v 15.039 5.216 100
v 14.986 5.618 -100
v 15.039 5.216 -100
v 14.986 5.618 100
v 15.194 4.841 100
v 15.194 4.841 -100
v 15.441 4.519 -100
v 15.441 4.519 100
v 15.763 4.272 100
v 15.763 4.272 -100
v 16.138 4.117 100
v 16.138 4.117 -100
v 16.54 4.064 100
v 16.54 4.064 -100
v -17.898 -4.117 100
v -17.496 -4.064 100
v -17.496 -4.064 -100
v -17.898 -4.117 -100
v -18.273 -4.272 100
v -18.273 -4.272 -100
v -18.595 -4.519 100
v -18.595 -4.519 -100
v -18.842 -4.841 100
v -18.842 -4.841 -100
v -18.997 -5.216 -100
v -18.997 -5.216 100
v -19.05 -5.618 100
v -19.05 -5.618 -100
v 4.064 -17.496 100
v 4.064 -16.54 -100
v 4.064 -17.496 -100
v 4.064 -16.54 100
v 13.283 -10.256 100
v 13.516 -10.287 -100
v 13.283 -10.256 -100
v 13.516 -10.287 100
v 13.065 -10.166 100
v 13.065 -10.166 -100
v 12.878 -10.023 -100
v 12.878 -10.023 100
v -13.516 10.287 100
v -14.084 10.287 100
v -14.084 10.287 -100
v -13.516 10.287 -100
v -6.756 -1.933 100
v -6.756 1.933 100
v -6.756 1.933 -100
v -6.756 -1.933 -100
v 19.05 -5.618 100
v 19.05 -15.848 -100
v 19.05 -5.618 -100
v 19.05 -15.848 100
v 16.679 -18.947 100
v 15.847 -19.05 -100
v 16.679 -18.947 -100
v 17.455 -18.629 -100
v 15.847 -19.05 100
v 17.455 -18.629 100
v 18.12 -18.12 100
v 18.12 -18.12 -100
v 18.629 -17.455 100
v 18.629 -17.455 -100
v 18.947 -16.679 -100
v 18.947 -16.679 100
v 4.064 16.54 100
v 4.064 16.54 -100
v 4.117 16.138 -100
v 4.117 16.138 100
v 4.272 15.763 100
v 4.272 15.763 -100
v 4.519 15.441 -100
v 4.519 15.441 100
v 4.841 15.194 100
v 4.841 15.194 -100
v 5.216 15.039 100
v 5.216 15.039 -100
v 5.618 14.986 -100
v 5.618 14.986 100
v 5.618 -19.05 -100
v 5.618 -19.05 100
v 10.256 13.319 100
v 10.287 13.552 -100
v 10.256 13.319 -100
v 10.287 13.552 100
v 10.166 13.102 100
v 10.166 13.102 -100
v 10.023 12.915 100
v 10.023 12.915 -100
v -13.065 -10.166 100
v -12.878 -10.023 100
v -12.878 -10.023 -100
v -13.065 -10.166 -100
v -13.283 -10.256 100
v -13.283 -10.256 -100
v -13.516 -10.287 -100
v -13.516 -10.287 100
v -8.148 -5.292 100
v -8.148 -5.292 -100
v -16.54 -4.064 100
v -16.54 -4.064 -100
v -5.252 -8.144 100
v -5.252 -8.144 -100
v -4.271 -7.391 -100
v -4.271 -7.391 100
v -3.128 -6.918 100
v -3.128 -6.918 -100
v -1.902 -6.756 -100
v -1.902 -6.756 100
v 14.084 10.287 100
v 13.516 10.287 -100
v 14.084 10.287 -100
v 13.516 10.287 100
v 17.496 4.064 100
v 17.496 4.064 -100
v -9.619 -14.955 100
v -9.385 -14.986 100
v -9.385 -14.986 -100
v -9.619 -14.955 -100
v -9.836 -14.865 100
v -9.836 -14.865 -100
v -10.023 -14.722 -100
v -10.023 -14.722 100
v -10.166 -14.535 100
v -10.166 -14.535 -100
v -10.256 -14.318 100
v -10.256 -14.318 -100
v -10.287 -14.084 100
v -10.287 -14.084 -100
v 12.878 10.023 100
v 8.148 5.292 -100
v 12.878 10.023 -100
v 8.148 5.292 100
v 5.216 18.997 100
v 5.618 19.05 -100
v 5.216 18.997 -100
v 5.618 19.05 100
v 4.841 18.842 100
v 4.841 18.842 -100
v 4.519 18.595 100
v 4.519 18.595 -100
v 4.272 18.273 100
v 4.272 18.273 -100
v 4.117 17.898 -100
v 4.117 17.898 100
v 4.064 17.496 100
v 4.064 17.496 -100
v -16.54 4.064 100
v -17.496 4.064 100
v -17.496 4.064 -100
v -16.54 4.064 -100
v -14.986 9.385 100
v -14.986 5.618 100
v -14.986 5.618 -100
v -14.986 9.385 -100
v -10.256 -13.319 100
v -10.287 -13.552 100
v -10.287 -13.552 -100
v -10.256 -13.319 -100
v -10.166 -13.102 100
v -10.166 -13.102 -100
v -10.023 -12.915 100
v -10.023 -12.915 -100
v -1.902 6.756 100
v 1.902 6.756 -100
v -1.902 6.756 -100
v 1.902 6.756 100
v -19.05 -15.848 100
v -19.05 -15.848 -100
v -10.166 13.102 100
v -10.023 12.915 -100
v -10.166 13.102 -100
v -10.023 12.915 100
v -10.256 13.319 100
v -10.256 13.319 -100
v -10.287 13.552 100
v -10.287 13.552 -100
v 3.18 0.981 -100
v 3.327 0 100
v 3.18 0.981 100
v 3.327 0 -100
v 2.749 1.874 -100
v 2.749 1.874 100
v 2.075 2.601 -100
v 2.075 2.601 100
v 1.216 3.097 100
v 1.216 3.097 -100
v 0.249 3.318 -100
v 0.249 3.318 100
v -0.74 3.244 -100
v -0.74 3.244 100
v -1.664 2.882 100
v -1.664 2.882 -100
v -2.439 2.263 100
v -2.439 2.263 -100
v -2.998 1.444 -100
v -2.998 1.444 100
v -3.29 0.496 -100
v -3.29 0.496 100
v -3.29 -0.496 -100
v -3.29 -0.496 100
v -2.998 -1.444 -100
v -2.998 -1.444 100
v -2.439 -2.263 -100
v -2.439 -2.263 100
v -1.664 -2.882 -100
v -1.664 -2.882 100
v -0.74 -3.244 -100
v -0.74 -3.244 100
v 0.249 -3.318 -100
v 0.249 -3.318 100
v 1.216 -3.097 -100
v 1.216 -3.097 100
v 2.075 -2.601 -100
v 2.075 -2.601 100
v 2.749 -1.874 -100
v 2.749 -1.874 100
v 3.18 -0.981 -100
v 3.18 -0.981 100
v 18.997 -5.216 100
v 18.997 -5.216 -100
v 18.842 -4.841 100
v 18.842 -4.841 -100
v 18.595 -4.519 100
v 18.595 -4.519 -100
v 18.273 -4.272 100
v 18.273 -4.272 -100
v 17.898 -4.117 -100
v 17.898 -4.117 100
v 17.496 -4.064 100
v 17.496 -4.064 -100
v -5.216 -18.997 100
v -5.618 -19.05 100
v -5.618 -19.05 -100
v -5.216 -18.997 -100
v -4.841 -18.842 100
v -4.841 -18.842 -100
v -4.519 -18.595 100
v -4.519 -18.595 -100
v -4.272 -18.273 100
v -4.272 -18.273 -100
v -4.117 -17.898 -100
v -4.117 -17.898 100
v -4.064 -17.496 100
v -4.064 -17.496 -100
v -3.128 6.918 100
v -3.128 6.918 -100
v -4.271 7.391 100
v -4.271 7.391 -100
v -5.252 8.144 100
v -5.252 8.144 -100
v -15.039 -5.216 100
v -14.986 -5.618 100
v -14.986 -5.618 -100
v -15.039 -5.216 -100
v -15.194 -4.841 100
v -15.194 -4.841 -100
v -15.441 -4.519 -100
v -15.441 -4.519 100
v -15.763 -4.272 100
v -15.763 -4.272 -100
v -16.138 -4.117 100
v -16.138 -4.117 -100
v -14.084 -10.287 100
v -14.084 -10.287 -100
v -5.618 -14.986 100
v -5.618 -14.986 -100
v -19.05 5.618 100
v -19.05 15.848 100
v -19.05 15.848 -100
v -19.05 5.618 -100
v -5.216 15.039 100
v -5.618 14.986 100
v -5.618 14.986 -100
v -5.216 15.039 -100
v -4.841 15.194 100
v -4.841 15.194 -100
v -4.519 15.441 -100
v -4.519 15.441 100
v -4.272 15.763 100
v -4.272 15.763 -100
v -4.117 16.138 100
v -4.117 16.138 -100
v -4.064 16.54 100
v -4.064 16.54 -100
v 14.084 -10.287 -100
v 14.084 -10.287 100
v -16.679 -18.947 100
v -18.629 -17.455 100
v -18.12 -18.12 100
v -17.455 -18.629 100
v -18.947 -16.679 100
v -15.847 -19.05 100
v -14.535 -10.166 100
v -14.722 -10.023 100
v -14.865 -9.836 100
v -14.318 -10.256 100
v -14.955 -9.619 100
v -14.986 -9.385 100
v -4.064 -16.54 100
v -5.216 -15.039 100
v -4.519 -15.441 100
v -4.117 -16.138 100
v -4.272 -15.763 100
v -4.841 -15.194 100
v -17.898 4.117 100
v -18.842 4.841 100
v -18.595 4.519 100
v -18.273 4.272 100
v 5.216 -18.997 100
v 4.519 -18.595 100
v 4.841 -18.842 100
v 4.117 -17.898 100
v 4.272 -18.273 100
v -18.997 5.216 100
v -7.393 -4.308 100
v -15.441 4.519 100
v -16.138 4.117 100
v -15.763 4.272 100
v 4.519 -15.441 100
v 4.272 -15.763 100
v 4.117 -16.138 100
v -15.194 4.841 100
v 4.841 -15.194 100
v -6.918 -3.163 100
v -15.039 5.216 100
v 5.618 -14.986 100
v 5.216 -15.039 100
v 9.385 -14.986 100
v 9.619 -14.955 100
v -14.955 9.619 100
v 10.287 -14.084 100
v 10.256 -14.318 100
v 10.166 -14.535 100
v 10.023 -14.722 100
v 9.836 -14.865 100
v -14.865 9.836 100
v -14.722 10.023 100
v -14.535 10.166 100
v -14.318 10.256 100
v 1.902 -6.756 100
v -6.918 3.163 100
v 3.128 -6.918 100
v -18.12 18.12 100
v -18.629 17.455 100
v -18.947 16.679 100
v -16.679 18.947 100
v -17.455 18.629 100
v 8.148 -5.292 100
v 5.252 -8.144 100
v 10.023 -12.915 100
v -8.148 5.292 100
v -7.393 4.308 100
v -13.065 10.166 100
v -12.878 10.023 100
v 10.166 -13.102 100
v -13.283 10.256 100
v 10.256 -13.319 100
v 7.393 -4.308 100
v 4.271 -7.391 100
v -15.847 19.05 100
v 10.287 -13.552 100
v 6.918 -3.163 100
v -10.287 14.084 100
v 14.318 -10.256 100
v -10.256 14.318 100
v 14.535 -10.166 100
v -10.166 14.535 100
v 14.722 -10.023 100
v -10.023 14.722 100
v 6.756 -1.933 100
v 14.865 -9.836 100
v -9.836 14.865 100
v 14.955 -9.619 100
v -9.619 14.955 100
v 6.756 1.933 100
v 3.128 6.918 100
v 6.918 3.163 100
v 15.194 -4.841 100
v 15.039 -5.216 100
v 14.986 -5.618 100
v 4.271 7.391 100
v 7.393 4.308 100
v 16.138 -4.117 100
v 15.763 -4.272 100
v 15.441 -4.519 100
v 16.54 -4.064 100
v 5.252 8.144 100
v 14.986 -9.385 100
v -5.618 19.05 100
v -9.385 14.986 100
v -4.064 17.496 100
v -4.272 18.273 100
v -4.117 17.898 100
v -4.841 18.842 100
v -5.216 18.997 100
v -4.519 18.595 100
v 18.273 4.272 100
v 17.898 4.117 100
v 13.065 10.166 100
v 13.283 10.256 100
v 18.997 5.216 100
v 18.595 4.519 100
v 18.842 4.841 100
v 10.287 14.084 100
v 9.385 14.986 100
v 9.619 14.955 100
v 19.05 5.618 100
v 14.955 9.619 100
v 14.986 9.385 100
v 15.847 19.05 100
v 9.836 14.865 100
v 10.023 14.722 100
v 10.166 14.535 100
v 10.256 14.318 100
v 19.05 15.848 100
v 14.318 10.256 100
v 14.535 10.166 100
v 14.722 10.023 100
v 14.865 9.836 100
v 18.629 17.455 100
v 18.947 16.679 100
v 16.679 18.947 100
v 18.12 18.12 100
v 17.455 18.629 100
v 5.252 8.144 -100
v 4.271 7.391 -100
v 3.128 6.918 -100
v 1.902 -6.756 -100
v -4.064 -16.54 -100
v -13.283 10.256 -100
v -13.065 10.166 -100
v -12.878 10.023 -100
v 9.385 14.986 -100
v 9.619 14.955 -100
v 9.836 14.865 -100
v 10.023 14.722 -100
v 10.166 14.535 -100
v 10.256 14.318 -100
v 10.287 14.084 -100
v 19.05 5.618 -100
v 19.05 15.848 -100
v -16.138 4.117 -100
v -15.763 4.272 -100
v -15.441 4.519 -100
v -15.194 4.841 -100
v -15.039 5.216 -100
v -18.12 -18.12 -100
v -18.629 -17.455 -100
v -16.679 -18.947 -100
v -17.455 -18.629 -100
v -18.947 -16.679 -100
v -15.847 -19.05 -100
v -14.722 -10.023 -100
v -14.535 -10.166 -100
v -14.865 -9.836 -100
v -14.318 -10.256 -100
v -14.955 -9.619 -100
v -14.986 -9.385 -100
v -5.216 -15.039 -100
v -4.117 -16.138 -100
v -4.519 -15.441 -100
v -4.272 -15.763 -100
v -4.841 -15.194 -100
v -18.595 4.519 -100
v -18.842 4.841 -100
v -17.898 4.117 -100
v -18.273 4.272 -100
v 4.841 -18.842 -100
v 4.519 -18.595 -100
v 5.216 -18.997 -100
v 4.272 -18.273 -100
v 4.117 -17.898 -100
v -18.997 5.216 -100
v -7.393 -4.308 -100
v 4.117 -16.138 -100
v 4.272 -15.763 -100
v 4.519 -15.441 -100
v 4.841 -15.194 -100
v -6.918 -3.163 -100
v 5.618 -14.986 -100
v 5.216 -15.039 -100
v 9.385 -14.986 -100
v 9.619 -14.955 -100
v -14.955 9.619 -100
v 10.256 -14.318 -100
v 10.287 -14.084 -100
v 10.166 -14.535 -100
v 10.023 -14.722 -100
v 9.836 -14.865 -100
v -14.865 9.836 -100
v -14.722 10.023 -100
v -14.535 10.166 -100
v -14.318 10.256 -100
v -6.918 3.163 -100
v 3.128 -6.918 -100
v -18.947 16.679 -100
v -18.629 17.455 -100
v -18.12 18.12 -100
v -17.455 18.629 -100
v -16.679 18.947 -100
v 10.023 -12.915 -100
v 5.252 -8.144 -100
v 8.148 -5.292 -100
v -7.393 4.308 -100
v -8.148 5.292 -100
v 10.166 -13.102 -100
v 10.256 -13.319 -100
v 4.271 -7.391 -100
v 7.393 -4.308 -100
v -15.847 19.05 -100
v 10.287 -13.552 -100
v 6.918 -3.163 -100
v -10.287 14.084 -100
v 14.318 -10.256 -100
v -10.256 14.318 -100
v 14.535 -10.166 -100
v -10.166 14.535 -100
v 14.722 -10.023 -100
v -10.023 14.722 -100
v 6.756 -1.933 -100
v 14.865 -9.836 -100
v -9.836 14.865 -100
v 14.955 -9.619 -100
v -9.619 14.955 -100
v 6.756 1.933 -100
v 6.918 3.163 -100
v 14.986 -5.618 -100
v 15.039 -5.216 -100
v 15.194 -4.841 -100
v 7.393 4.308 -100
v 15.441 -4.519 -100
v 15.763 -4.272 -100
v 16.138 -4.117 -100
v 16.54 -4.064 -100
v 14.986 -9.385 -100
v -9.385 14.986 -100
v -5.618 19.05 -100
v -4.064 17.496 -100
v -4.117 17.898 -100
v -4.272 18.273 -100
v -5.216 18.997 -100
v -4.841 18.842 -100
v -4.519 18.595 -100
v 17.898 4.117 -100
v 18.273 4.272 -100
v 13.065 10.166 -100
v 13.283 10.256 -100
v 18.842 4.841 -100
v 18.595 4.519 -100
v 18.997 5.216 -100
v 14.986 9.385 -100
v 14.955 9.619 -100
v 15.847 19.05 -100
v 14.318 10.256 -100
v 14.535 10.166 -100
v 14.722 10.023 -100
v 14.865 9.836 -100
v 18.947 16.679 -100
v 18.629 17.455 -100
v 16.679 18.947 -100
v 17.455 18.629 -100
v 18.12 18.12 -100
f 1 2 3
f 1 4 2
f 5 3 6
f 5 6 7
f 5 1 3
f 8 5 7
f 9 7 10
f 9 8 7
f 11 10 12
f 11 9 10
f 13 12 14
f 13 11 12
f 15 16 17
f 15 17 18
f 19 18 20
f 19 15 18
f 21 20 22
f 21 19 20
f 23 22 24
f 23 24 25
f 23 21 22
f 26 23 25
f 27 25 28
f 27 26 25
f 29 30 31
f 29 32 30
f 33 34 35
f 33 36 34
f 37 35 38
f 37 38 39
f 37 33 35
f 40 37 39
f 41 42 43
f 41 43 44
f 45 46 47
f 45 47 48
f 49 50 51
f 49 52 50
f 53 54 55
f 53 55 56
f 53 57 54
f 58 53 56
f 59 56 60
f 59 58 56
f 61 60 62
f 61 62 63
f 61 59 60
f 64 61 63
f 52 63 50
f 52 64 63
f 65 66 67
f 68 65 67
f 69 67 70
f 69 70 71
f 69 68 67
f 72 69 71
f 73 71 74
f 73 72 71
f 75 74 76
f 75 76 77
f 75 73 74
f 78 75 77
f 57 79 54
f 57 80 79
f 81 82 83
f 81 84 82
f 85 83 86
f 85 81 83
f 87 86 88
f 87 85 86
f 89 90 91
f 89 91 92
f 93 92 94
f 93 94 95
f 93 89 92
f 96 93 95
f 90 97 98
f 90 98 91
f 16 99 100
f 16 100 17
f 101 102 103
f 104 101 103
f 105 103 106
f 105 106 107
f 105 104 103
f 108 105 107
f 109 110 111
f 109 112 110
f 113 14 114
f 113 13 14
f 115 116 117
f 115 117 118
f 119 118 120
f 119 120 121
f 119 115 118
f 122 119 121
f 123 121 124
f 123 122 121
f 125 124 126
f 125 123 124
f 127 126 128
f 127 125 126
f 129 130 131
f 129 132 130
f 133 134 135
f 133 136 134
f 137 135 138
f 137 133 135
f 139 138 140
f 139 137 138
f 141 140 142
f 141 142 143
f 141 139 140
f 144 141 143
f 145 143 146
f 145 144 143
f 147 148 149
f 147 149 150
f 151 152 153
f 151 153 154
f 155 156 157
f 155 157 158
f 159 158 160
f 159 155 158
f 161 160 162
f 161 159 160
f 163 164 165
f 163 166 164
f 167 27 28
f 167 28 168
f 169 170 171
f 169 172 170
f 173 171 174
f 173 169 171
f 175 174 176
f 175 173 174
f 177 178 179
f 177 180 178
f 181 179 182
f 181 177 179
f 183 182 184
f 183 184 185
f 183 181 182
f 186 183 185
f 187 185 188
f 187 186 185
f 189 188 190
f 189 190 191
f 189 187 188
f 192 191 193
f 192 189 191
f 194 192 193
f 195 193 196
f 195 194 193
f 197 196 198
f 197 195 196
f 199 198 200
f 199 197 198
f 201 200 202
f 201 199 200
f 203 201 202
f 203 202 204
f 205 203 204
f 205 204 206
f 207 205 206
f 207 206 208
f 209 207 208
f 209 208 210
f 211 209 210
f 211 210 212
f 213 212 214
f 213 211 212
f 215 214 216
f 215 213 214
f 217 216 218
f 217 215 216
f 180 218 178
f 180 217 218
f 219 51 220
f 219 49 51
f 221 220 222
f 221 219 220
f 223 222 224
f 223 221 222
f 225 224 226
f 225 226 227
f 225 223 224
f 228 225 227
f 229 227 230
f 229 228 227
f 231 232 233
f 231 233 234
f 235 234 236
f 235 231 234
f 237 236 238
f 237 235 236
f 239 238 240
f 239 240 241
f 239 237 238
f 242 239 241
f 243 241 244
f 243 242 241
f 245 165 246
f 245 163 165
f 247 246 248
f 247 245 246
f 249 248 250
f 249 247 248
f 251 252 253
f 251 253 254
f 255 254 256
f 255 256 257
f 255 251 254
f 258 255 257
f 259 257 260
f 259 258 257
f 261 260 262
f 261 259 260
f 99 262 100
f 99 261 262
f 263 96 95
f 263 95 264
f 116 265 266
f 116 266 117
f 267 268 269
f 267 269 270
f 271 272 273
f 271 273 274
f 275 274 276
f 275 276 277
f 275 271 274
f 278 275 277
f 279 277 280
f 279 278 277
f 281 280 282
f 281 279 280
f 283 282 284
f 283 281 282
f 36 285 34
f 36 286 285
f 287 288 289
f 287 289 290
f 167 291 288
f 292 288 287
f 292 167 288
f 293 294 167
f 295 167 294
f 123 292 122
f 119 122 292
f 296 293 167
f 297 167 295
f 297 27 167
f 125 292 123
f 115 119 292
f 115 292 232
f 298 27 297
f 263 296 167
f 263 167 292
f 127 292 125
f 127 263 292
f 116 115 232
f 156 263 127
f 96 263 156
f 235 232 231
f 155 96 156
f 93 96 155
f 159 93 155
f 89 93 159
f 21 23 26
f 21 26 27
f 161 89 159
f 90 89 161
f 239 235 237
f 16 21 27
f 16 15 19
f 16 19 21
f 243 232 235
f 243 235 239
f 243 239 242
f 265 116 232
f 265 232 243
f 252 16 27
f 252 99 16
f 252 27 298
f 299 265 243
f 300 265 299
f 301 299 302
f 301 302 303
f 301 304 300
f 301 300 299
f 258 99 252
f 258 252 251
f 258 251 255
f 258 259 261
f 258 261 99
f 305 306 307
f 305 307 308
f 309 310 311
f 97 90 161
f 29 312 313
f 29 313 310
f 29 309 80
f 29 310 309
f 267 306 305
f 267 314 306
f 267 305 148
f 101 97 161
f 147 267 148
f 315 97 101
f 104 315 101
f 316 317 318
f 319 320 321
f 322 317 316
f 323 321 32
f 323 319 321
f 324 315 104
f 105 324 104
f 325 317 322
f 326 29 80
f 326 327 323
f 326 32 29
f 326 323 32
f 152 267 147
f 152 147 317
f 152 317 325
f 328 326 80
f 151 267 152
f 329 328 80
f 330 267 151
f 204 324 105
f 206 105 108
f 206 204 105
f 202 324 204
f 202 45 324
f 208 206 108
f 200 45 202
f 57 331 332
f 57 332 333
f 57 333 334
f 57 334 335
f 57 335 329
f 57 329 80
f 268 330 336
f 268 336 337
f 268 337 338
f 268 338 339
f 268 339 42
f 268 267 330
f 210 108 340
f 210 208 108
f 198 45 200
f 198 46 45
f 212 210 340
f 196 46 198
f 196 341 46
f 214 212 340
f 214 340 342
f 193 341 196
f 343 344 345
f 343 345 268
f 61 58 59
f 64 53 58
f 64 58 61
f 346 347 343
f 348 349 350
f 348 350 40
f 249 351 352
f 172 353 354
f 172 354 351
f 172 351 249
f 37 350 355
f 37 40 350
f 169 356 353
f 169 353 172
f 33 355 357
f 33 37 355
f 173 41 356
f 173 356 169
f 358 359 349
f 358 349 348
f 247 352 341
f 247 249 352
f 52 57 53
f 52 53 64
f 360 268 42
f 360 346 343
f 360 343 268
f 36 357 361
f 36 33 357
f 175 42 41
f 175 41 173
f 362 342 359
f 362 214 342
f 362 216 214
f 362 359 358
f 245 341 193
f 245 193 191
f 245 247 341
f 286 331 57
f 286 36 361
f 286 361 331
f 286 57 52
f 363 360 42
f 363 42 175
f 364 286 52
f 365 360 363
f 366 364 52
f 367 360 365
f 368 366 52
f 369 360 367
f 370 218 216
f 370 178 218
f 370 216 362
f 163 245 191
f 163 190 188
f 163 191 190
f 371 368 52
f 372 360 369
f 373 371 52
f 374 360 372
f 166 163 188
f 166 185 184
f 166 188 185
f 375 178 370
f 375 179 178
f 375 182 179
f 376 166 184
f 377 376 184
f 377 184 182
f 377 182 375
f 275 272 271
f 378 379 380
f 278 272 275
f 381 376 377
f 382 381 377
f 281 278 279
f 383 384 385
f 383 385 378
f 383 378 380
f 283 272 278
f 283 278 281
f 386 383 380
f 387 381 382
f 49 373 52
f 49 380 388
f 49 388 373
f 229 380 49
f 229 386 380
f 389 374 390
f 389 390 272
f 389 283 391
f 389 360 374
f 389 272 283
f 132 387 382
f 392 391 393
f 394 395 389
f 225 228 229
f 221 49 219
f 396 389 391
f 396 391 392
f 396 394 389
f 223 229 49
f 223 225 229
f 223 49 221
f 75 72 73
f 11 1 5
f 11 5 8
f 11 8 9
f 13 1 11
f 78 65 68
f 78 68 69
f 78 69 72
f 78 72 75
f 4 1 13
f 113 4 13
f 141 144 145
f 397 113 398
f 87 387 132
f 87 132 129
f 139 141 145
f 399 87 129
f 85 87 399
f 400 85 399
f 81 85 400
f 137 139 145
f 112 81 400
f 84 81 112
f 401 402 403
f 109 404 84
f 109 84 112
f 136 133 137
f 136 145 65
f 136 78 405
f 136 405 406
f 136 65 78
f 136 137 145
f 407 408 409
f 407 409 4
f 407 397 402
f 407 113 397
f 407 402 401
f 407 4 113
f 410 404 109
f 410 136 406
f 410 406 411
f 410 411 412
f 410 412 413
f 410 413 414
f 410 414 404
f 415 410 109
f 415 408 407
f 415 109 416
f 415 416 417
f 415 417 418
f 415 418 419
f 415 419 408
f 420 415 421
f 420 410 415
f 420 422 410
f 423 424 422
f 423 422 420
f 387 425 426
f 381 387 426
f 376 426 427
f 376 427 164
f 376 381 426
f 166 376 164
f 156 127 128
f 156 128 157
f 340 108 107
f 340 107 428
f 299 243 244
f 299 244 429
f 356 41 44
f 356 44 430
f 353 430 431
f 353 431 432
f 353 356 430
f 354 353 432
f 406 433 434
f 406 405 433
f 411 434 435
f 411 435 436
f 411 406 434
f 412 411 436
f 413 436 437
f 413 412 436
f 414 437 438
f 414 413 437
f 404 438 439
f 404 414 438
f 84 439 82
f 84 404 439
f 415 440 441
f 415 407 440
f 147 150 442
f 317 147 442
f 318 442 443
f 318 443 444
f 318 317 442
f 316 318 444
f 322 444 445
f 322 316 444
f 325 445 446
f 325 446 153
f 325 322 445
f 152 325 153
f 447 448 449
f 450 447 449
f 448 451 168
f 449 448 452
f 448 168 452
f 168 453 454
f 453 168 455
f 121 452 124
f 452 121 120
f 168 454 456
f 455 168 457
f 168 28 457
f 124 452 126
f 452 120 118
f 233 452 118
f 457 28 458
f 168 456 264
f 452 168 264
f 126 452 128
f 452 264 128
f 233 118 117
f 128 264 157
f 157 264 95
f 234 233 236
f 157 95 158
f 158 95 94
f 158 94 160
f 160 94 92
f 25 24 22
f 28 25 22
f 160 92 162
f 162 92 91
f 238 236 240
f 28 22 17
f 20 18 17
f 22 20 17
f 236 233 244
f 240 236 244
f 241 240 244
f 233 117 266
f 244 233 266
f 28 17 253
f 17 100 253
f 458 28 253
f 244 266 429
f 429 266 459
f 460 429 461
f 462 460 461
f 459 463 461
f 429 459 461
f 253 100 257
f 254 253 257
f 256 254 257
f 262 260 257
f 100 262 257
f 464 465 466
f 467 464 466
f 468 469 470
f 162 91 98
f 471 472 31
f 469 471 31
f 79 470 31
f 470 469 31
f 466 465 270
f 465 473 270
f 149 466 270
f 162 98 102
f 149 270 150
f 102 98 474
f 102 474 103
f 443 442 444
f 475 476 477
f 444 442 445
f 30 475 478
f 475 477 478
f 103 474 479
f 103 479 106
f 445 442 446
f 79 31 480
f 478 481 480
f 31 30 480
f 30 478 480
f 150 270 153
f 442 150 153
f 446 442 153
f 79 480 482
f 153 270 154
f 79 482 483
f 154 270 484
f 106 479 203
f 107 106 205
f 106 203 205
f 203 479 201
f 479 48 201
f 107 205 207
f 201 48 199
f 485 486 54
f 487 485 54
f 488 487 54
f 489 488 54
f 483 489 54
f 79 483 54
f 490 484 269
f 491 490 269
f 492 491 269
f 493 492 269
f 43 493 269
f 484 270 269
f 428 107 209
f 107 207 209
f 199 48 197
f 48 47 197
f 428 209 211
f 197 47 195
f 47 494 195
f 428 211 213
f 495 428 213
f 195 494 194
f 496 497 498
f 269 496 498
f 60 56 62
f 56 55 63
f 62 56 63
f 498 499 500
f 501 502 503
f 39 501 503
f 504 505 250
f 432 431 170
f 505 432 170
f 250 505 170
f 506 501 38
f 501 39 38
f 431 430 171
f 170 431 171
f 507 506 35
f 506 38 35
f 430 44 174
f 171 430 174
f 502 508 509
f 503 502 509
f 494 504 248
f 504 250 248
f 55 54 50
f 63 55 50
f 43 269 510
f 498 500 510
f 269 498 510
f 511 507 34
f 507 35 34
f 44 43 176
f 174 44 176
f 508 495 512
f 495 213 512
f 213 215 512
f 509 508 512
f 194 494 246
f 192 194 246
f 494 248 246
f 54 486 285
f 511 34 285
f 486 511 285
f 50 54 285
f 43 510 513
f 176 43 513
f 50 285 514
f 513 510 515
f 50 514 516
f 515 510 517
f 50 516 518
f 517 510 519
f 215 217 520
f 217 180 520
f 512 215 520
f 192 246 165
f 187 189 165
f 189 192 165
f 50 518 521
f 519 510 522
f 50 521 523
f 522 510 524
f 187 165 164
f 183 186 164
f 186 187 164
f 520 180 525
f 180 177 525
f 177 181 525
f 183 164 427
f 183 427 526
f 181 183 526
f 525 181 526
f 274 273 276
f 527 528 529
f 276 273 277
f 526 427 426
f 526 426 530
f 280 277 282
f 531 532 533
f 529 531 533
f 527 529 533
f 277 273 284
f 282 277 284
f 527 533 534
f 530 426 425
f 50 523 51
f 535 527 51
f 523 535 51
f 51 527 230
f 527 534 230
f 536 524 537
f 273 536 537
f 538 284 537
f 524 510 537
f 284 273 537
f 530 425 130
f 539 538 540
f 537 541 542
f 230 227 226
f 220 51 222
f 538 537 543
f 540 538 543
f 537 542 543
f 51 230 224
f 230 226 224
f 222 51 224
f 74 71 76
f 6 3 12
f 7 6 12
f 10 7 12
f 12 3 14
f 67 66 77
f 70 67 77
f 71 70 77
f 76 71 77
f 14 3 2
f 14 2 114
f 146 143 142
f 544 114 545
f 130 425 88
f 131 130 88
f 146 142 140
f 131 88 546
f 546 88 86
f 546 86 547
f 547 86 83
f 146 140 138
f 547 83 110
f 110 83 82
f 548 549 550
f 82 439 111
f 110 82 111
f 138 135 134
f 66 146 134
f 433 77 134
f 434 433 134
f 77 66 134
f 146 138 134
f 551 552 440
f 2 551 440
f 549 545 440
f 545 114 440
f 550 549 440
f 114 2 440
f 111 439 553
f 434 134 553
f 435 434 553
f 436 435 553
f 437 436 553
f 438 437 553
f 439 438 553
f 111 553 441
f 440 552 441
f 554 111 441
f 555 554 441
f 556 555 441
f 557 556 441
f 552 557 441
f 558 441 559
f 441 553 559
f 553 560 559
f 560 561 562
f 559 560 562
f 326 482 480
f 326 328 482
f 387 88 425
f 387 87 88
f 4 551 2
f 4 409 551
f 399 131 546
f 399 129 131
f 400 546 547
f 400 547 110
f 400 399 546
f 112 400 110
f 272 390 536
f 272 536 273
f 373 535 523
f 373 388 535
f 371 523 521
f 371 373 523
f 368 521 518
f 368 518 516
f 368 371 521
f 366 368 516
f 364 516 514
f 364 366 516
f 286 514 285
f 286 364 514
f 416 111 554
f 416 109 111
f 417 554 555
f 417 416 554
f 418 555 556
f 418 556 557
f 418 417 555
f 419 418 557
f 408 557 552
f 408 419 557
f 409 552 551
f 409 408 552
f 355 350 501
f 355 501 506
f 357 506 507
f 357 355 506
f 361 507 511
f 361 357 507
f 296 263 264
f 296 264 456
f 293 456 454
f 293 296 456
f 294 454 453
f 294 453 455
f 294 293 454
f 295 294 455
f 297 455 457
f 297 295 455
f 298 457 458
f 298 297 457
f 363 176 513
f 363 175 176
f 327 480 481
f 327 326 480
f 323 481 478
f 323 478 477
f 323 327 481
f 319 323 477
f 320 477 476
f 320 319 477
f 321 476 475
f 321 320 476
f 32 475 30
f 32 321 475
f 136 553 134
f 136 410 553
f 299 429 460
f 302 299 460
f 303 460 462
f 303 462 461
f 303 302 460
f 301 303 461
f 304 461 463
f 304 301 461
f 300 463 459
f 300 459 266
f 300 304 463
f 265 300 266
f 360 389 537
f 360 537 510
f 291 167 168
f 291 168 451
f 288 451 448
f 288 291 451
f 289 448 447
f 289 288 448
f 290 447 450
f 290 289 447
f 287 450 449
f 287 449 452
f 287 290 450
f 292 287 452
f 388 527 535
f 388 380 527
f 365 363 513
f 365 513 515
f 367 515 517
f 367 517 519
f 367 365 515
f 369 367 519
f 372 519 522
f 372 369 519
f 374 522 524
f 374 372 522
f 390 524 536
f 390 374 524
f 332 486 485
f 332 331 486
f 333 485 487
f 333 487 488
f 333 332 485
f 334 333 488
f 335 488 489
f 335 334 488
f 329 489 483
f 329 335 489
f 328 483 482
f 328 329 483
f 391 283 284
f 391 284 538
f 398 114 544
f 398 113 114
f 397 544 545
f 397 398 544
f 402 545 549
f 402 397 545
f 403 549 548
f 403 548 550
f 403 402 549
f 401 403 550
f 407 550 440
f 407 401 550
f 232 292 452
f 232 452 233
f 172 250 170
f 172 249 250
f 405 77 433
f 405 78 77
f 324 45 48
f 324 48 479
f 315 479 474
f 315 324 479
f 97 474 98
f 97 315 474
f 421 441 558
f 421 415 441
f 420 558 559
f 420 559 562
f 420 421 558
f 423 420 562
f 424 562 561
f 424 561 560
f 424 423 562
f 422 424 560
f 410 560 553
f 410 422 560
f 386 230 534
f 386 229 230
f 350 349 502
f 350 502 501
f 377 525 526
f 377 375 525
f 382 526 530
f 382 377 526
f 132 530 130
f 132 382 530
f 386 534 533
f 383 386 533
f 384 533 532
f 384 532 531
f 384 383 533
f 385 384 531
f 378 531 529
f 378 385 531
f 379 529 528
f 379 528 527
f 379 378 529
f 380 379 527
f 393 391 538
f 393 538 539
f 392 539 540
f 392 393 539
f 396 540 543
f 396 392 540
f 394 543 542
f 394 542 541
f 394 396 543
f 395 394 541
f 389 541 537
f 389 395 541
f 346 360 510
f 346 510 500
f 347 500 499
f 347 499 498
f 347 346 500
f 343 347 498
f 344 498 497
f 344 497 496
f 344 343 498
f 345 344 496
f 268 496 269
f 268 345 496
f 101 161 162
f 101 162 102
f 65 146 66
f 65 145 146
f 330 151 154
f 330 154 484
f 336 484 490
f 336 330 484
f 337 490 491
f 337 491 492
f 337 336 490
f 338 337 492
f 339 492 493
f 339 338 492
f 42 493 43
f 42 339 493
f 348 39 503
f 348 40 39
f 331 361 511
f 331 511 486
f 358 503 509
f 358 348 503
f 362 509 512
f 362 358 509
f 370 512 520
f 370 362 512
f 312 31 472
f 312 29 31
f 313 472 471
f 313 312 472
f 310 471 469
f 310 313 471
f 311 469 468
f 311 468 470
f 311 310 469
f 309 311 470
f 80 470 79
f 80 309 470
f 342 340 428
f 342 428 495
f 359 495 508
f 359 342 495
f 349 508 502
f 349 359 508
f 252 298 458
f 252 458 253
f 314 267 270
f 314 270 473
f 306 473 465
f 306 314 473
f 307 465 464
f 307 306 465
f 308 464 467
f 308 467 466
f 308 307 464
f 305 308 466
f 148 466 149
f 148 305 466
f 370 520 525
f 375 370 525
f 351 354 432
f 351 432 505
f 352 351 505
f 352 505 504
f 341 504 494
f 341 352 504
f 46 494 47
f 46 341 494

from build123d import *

# Parameters (mm, degrees)
SKETCH1_R           = 3.3274
BOSS_EXTRUDE1_DEPTH = 100


with BuildPart() as part:
    # Sketch1 → Boss-Extrude1 (new, symmetric)
    with BuildSketch(Plane.XY):
        with BuildLine():
            Line((-10.287, 13.552357131), (-10.287, 14.0843))
            ThreePointArc((-10.287, 14.0843), (-10.022898185, 14.721898185), (-9.3853, 14.986))
            Line((-9.3853, 14.986), (-5.617617549, 14.986))
            ThreePointArc((-5.617617549, 14.986), (-4.519044045, 15.441044045), (-4.064, 16.539617549))
            Line((-4.064, 16.539617549), (-4.064, 17.496382451))
            ThreePointArc((-4.064, 17.496382451), (-4.519044045, 18.594955955), (-5.617617549, 19.05))
            Line((-5.617617549, 19.05), (-7.974178704, 19.05))
            Line((-7.974178704, 19.05), (-15.847487039, 19.05))
            ThreePointArc((-15.847487039, 19.05), (-18.120176289, 18.120192083), (-19.05, 15.847509295))
            Line((-19.05, 15.847509295), (-19.05, 7.97632366))
            Line((-19.05, 7.97632366), (-19.05, 5.617617549))
            ThreePointArc((-19.05, 5.617617549), (-18.594955955, 4.519044045), (-17.496382451, 4.064))
            Line((-17.496382451, 4.064), (-16.539617549, 4.064))
            ThreePointArc((-16.539617549, 4.064), (-15.441044045, 4.519044045), (-14.986, 5.617617549))
            Line((-14.986, 5.617617549), (-14.986, 9.385342516))
            ThreePointArc((-14.986, 9.385342516), (-14.721898185, 10.022940701), (-14.0843, 10.287042516))
            Line((-14.0843, 10.287042516), (-13.516042086, 10.287042516))
            ThreePointArc((-13.516042086, 10.287042516), (-13.170975923, 10.218404478), (-12.878443117, 10.022939917))
            Line((-12.878443117, 10.022939917), (-8.14758008, 5.292065243))
            ThreePointArc((-8.14758008, 5.292065243), (-7.117955879, 3.751120653), (-6.7564, 1.933453584))
            Line((-6.7564, 1.933453584), (-6.7564, -1.933453584))
            ThreePointArc((-6.7564, -1.933453584), (-7.117955879, -3.751120653), (-8.14758008, -5.292065243))
            Line((-8.14758008, -5.292065243), (-12.878443117, -10.022939917))
            ThreePointArc((-12.878443117, -10.022939917), (-13.170975923, -10.218404478), (-13.516042086, -10.287042516))
            Line((-13.516042086, -10.287042516), (-14.0843, -10.287042516))
            ThreePointArc((-14.0843, -10.287042516), (-14.721898185, -10.022940701), (-14.986, -9.385342516))
            Line((-14.986, -9.385342516), (-14.986, -5.617617549))
            ThreePointArc((-14.986, -5.617617549), (-15.441044045, -4.519044045), (-16.539617549, -4.064))
            Line((-16.539617549, -4.064), (-17.496382451, -4.064))
            ThreePointArc((-17.496382451, -4.064), (-18.594955955, -4.519044045), (-19.05, -5.617617549))
            Line((-19.05, -5.617617549), (-19.05, -7.976318491))
            Line((-19.05, -7.976318491), (-19.05, -15.847510721))
            ThreePointArc((-19.05, -15.847510721), (-18.120175716, -18.120192644), (-15.847486868, -19.05))
            Line((-15.847486868, -19.05), (-7.976294616, -19.05))
            Line((-7.976294616, -19.05), (-5.617617549, -19.05))
            ThreePointArc((-5.617617549, -19.05), (-4.519044045, -18.594955955), (-4.064, -17.496382451))
            Line((-4.064, -17.496382451), (-4.064, -16.539617549))
            ThreePointArc((-4.064, -16.539617549), (-4.519044045, -15.441044045), (-5.617617549, -14.986))
            Line((-5.617617549, -14.986), (-9.3853, -14.986))
            ThreePointArc((-9.3853, -14.986), (-10.022898185, -14.721898185), (-10.287, -14.0843))
            Line((-10.287, -14.0843), (-10.287, -13.552357131))
            ThreePointArc((-10.287, -13.552357131), (-10.218362387, -13.207291992), (-10.022898969, -12.91475973))
            Line((-10.022898969, -12.91475973), (-5.252158105, -8.144007132))
            ThreePointArc((-5.252158105, -8.144007132), (-3.715177372, -7.117027388), (-1.902183975, -6.7564))
            Line((-1.902183975, -6.7564), (1.902183975, -6.7564))
            ThreePointArc((1.902183975, -6.7564), (3.715177372, -7.117027388), (5.252158105, -8.144007132))
            Line((5.252158105, -8.144007132), (10.022898969, -12.91475973))
            ThreePointArc((10.022898969, -12.91475973), (10.218362387, -13.207291992), (10.287, -13.552357131))
            Line((10.287, -13.552357131), (10.287, -14.0843))
            ThreePointArc((10.287, -14.0843), (10.022898185, -14.721898185), (9.3853, -14.986))
            Line((9.3853, -14.986), (5.617617549, -14.986))
            ThreePointArc((5.617617549, -14.986), (4.519044045, -15.441044045), (4.064, -16.539617549))
            Line((4.064, -16.539617549), (4.064, -17.496382451))
            ThreePointArc((4.064, -17.496382451), (4.519044045, -18.594955955), (5.617617549, -19.05))
            Line((5.617617549, -19.05), (7.976294616, -19.05))
            Line((7.976294616, -19.05), (15.847486868, -19.05))
            ThreePointArc((15.847486868, -19.05), (18.120175716, -18.120192644), (19.05, -15.847510721))
            Line((19.05, -15.847510721), (19.05, -7.976318491))
            Line((19.05, -7.976318491), (19.05, -5.617617549))
            ThreePointArc((19.05, -5.617617549), (18.594955955, -4.519044045), (17.496382451, -4.064))
            Line((17.496382451, -4.064), (16.539617549, -4.064))
            ThreePointArc((16.539617549, -4.064), (15.441044045, -4.519044045), (14.986, -5.617617549))
            Line((14.986, -5.617617549), (14.986, -9.385342516))
            ThreePointArc((14.986, -9.385342516), (14.721898185, -10.022940701), (14.0843, -10.287042516))
            Line((14.0843, -10.287042516), (13.516042086, -10.287042516))
            ThreePointArc((13.516042086, -10.287042516), (13.170975923, -10.218404478), (12.878443117, -10.022939917))
            Line((12.878443117, -10.022939917), (8.14758008, -5.292065243))
            ThreePointArc((8.14758008, -5.292065243), (7.117955879, -3.751120653), (6.7564, -1.933453584))
            Line((6.7564, -1.933453584), (6.7564, 1.933453584))
            ThreePointArc((6.7564, 1.933453584), (7.117955879, 3.751120653), (8.14758008, 5.292065243))
            Line((8.14758008, 5.292065243), (12.878443117, 10.022939917))
            ThreePointArc((12.878443117, 10.022939917), (13.170975923, 10.218404478), (13.516042086, 10.287042516))
            Line((13.516042086, 10.287042516), (14.0843, 10.287042516))
            ThreePointArc((14.0843, 10.287042516), (14.721898185, 10.022940701), (14.986, 9.385342516))
            Line((14.986, 9.385342516), (14.986, 5.617617549))
            ThreePointArc((14.986, 5.617617549), (15.441044045, 4.519044045), (16.539617549, 4.064))
            Line((16.539617549, 4.064), (17.496382451, 4.064))
            ThreePointArc((17.496382451, 4.064), (18.594955955, 4.519044045), (19.05, 5.617617549))
            Line((19.05, 5.617617549), (19.05, 9.496091471))
            Line((19.05, 9.496091471), (19.05, 15.847509295))
            ThreePointArc((19.05, 15.847509295), (18.120176289, 18.120192083), (15.847487039, 19.05))
            Line((15.847487039, 19.05), (7.974178704, 19.05))
            Line((7.974178704, 19.05), (5.617617549, 19.05))
            ThreePointArc((5.617617549, 19.05), (4.519044045, 18.594955955), (4.064, 17.496382451))
            Line((4.064, 17.496382451), (4.064, 16.539617549))
            ThreePointArc((4.064, 16.539617549), (4.519044045, 15.441044045), (5.617617549, 14.986))
            Line((5.617617549, 14.986), (9.3853, 14.986))
            ThreePointArc((9.3853, 14.986), (10.022898185, 14.721898185), (10.287, 14.0843))
            Line((10.287, 14.0843), (10.287, 13.552357131))
            ThreePointArc((10.287, 13.552357131), (10.218362387, 13.207291992), (10.022898969, 12.91475973))
            Line((10.022898969, 12.91475973), (5.252158105, 8.144007132))
            ThreePointArc((5.252158105, 8.144007132), (3.715177372, 7.117027388), (1.902183975, 6.7564))
            Line((1.902183975, 6.7564), (-1.902183975, 6.7564))
            ThreePointArc((-1.902183975, 6.7564), (-3.715177372, 7.117027388), (-5.252158105, 8.144007132))
            Line((-5.252158105, 8.144007132), (-10.022898969, 12.91475973))
            ThreePointArc((-10.022898969, 12.91475973), (-10.218362387, 13.207291992), (-10.287, 13.552357131))
        make_face()
        Circle(SKETCH1_R, mode=Mode.SUBTRACT)
    extrude(amount=BOSS_EXTRUDE1_DEPTH, both=True)


solid = part.part
